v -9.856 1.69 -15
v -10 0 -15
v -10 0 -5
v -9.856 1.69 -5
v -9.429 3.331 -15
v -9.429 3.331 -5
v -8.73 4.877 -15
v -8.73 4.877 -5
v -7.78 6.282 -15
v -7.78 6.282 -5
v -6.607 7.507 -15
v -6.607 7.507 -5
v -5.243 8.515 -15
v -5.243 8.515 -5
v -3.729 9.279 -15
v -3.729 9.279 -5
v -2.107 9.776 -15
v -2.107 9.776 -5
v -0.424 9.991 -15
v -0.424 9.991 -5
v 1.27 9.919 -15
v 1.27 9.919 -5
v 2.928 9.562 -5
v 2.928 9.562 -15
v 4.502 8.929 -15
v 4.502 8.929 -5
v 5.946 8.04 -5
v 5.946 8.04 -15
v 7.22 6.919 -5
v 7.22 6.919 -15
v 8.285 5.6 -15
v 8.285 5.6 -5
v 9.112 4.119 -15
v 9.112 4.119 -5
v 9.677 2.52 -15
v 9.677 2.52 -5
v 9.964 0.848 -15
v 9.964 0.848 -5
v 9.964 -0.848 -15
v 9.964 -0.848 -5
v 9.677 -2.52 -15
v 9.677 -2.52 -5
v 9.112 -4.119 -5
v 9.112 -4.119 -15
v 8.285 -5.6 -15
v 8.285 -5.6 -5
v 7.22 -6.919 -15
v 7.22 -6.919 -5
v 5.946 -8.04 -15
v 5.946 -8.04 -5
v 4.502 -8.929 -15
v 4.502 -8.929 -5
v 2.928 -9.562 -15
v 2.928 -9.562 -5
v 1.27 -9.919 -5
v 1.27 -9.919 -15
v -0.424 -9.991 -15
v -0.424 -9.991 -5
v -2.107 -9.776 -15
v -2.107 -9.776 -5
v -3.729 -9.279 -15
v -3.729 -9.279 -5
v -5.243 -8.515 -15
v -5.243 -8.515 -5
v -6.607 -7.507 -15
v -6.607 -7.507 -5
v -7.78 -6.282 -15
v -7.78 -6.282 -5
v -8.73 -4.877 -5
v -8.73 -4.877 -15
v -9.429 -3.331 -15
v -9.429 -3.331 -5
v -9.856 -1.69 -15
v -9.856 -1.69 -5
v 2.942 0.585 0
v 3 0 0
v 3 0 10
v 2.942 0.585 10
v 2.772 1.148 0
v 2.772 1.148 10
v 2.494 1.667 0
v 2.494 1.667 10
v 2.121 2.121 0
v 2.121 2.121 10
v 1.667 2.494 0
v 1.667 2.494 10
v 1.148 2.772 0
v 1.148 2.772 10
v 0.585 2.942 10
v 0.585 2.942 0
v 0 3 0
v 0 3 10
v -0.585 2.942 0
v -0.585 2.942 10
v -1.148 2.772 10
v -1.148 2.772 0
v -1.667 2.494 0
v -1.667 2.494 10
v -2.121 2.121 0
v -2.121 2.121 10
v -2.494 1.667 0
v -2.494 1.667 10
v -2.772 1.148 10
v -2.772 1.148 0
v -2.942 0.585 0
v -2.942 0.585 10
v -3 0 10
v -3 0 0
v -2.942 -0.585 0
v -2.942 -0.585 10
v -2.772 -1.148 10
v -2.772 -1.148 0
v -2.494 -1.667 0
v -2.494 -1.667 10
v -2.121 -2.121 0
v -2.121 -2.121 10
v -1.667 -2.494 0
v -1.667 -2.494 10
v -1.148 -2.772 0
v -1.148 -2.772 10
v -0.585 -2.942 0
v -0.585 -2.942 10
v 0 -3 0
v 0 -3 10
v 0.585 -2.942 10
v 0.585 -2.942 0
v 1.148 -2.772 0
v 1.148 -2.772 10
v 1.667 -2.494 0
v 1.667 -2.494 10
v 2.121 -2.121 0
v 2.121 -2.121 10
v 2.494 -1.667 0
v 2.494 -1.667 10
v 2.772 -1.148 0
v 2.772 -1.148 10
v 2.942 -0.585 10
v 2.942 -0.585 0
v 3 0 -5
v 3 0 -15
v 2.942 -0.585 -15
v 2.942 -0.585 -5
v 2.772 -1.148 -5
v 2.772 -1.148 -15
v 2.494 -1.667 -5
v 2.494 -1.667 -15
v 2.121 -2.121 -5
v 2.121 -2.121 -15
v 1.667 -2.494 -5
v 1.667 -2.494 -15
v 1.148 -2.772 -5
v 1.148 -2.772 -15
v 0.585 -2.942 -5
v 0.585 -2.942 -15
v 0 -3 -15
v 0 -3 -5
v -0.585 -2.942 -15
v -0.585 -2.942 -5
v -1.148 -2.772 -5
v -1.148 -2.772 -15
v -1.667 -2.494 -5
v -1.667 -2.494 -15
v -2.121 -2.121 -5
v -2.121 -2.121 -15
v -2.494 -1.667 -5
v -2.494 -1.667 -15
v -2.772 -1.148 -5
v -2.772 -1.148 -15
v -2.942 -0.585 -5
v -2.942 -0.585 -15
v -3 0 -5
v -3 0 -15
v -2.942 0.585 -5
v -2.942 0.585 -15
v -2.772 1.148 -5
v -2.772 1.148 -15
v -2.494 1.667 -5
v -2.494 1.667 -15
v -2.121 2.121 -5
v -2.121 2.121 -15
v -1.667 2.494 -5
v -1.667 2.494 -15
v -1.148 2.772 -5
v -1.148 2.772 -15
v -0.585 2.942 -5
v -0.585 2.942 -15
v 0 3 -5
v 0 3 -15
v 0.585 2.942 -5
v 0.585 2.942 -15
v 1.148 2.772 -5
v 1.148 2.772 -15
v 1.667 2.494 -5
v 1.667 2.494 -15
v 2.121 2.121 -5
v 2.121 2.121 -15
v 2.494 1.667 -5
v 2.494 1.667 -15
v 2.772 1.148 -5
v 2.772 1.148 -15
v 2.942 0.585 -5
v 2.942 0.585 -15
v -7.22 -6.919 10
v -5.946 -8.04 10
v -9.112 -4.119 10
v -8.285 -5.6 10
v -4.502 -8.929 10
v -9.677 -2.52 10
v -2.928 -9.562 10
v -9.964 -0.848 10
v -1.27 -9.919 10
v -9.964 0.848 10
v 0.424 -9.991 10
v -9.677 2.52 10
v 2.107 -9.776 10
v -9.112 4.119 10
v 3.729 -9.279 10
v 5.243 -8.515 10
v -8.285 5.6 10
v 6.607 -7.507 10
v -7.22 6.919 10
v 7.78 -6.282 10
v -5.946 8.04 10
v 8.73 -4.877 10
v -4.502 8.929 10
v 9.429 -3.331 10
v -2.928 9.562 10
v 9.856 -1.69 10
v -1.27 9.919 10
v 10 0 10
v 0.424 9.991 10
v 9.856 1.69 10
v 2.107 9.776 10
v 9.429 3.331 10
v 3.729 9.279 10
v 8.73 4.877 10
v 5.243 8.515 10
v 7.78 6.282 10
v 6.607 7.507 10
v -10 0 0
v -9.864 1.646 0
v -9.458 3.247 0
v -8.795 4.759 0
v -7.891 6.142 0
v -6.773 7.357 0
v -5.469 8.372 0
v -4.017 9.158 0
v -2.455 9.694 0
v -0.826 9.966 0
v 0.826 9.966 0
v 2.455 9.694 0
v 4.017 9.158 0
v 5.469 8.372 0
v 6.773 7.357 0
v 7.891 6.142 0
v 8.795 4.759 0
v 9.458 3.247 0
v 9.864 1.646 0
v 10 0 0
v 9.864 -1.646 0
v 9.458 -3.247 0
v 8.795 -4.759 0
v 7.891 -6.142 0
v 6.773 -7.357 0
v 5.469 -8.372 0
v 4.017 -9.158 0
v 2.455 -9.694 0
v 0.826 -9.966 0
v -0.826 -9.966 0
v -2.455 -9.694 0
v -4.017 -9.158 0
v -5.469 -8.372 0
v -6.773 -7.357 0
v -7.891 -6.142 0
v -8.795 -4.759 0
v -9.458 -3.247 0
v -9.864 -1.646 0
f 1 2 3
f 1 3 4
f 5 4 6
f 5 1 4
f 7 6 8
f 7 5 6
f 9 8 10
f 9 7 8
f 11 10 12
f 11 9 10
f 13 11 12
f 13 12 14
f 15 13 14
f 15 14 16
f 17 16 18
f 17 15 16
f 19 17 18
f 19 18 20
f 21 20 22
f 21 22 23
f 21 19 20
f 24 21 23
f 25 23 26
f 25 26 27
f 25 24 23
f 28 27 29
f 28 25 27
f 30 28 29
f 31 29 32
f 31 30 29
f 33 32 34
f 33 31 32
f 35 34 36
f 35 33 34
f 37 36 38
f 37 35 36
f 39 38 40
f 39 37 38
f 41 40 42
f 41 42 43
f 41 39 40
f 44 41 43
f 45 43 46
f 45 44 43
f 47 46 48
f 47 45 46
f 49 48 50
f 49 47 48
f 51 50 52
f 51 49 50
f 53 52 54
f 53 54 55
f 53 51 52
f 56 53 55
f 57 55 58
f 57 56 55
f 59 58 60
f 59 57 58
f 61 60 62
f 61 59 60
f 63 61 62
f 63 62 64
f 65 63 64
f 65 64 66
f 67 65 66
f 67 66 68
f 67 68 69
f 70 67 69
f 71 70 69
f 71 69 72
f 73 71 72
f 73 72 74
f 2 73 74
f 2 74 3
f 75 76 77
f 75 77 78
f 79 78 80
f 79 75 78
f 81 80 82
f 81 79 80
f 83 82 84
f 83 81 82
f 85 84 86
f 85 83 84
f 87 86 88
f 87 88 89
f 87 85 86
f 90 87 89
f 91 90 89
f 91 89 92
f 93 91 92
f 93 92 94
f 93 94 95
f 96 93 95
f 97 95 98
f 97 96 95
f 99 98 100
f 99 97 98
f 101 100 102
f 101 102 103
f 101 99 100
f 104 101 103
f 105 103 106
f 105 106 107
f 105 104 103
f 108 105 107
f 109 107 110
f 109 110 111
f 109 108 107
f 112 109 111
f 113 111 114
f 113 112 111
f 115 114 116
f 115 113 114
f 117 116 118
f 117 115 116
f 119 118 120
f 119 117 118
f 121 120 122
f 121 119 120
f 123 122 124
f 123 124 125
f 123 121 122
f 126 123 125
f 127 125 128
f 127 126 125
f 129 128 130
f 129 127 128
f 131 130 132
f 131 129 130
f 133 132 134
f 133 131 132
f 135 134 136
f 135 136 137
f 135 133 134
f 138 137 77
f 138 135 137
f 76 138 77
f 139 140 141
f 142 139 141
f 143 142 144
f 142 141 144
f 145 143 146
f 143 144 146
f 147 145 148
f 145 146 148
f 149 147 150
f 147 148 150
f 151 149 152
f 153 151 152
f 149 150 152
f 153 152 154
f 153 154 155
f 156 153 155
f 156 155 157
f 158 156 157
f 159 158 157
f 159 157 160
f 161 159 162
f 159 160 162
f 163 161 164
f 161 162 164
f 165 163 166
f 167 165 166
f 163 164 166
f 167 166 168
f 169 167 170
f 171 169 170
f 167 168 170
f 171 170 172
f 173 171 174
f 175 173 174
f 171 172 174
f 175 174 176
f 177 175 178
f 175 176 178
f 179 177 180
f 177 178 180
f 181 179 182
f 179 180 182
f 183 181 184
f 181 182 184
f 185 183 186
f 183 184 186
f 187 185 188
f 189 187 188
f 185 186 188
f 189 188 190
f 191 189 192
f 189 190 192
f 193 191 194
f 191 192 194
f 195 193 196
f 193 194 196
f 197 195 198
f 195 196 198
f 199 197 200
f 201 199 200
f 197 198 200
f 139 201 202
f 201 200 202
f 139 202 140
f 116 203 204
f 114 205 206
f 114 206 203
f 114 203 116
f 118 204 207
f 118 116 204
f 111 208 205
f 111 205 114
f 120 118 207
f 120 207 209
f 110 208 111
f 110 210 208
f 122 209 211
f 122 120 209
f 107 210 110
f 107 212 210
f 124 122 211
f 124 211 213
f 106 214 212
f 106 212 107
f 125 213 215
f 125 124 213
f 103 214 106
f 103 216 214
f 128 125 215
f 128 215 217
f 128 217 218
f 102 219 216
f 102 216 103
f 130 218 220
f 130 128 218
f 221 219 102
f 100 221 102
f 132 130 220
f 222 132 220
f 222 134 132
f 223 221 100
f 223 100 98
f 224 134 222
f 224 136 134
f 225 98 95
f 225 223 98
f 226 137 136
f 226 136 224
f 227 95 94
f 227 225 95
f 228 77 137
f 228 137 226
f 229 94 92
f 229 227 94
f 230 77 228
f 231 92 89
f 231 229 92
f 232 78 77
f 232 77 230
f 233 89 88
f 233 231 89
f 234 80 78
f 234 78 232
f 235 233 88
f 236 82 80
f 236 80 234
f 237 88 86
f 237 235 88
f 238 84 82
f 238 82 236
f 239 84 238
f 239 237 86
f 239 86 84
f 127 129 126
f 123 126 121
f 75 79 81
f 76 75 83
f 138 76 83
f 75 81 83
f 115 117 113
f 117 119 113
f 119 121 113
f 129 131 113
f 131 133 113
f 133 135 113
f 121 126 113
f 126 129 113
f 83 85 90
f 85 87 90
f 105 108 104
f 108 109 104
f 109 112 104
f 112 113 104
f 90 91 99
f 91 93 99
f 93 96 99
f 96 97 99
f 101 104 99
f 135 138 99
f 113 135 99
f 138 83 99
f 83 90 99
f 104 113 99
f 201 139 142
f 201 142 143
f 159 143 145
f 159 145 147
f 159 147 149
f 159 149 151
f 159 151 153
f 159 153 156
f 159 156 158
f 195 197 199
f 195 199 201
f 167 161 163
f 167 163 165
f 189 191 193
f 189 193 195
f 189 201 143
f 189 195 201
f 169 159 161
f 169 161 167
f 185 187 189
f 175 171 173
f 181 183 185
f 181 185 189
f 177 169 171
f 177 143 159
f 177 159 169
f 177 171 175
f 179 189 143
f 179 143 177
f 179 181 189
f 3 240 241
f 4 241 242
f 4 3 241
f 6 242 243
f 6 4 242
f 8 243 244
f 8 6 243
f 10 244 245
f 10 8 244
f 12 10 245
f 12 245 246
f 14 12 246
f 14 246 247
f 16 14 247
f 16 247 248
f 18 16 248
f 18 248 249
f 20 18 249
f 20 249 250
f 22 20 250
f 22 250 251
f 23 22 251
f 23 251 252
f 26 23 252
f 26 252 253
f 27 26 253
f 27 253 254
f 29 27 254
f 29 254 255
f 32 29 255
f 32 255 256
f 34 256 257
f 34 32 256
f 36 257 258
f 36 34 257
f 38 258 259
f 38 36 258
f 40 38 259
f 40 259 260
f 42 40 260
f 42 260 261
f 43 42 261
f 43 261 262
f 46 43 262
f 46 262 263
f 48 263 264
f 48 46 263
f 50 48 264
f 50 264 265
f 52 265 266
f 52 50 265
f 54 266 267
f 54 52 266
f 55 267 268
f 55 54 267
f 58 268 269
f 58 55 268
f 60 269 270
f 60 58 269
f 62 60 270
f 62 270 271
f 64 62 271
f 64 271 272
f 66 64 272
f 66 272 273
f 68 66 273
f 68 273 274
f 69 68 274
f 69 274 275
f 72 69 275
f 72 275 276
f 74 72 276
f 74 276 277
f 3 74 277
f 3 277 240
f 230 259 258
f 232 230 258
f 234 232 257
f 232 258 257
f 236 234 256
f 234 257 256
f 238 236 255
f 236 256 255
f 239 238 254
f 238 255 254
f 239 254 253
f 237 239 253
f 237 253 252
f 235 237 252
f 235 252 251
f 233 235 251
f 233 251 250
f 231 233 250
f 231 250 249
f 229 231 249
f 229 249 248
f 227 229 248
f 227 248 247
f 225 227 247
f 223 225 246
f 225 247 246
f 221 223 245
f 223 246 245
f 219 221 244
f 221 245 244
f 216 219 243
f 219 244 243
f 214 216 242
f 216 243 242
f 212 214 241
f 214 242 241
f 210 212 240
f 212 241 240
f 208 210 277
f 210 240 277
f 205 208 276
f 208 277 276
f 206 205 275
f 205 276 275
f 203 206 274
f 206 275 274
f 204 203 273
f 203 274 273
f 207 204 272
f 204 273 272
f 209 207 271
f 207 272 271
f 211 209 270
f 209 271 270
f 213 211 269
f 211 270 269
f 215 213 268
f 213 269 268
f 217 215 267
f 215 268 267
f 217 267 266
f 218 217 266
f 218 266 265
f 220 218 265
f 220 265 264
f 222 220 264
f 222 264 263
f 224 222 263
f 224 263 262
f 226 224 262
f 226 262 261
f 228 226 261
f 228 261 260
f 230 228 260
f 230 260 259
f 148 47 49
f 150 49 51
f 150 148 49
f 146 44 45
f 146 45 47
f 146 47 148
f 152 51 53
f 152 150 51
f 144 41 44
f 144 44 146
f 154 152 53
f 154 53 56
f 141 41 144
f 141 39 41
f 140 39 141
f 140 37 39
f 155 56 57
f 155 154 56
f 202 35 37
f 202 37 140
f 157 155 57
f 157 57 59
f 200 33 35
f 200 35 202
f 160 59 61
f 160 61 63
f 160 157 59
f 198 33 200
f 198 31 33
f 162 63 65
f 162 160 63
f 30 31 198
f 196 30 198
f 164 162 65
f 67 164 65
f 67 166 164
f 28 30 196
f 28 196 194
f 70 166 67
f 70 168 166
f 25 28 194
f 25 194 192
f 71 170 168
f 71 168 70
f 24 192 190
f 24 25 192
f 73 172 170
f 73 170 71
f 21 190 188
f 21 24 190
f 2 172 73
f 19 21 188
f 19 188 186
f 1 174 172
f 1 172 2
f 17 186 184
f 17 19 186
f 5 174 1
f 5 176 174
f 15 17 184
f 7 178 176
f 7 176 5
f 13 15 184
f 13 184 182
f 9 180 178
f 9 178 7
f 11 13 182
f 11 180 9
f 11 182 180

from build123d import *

# Parameters (mm, degrees)
SKETCH1_R           = 10
SKETCH1_R_2         = 3
BOSS_EXTRUDE1_DEPTH = 10
BOSS_EXTRUDE3_START = 5
SKETCH4_R           = 10
BOSS_EXTRUDE3_DEPTH = 5
BOSS_EXTRUDE4_START = 10
SKETCH5_R           = 10
SKETCH5_R_2         = 3
BOSS_EXTRUDE4_DEPTH = 10


with BuildPart() as part:
    # Sketch1 → Boss-Extrude1 (new body)
    with BuildSketch(Plane.XY):
        Circle(SKETCH1_R)
        Circle(SKETCH1_R_2, mode=Mode.SUBTRACT)
    extrude(amount=BOSS_EXTRUDE1_DEPTH)

    # Sketch4 → Boss-Extrude3 (add)
    with BuildSketch(Plane(origin=(0, 0, 0), x_dir=(-1, 0, 0), z_dir=(0, 0, -1)).offset(BOSS_EXTRUDE3_START)):
        Circle(SKETCH4_R)
    extrude(amount=-BOSS_EXTRUDE3_DEPTH)

    # Sketch5 → Boss-Extrude4 (add)
    with BuildSketch(Plane(origin=(0, 0, -5), x_dir=(-1, 0, 0), z_dir=(0, 0, -1)).offset(BOSS_EXTRUDE4_START)):
        Circle(SKETCH5_R)
        with Locations(Location((0, 0, 0), (0, 0, 180))):
            Circle(SKETCH5_R_2, mode=Mode.SUBTRACT)
    extrude(amount=-BOSS_EXTRUDE4_DEPTH)


solid = part.part
